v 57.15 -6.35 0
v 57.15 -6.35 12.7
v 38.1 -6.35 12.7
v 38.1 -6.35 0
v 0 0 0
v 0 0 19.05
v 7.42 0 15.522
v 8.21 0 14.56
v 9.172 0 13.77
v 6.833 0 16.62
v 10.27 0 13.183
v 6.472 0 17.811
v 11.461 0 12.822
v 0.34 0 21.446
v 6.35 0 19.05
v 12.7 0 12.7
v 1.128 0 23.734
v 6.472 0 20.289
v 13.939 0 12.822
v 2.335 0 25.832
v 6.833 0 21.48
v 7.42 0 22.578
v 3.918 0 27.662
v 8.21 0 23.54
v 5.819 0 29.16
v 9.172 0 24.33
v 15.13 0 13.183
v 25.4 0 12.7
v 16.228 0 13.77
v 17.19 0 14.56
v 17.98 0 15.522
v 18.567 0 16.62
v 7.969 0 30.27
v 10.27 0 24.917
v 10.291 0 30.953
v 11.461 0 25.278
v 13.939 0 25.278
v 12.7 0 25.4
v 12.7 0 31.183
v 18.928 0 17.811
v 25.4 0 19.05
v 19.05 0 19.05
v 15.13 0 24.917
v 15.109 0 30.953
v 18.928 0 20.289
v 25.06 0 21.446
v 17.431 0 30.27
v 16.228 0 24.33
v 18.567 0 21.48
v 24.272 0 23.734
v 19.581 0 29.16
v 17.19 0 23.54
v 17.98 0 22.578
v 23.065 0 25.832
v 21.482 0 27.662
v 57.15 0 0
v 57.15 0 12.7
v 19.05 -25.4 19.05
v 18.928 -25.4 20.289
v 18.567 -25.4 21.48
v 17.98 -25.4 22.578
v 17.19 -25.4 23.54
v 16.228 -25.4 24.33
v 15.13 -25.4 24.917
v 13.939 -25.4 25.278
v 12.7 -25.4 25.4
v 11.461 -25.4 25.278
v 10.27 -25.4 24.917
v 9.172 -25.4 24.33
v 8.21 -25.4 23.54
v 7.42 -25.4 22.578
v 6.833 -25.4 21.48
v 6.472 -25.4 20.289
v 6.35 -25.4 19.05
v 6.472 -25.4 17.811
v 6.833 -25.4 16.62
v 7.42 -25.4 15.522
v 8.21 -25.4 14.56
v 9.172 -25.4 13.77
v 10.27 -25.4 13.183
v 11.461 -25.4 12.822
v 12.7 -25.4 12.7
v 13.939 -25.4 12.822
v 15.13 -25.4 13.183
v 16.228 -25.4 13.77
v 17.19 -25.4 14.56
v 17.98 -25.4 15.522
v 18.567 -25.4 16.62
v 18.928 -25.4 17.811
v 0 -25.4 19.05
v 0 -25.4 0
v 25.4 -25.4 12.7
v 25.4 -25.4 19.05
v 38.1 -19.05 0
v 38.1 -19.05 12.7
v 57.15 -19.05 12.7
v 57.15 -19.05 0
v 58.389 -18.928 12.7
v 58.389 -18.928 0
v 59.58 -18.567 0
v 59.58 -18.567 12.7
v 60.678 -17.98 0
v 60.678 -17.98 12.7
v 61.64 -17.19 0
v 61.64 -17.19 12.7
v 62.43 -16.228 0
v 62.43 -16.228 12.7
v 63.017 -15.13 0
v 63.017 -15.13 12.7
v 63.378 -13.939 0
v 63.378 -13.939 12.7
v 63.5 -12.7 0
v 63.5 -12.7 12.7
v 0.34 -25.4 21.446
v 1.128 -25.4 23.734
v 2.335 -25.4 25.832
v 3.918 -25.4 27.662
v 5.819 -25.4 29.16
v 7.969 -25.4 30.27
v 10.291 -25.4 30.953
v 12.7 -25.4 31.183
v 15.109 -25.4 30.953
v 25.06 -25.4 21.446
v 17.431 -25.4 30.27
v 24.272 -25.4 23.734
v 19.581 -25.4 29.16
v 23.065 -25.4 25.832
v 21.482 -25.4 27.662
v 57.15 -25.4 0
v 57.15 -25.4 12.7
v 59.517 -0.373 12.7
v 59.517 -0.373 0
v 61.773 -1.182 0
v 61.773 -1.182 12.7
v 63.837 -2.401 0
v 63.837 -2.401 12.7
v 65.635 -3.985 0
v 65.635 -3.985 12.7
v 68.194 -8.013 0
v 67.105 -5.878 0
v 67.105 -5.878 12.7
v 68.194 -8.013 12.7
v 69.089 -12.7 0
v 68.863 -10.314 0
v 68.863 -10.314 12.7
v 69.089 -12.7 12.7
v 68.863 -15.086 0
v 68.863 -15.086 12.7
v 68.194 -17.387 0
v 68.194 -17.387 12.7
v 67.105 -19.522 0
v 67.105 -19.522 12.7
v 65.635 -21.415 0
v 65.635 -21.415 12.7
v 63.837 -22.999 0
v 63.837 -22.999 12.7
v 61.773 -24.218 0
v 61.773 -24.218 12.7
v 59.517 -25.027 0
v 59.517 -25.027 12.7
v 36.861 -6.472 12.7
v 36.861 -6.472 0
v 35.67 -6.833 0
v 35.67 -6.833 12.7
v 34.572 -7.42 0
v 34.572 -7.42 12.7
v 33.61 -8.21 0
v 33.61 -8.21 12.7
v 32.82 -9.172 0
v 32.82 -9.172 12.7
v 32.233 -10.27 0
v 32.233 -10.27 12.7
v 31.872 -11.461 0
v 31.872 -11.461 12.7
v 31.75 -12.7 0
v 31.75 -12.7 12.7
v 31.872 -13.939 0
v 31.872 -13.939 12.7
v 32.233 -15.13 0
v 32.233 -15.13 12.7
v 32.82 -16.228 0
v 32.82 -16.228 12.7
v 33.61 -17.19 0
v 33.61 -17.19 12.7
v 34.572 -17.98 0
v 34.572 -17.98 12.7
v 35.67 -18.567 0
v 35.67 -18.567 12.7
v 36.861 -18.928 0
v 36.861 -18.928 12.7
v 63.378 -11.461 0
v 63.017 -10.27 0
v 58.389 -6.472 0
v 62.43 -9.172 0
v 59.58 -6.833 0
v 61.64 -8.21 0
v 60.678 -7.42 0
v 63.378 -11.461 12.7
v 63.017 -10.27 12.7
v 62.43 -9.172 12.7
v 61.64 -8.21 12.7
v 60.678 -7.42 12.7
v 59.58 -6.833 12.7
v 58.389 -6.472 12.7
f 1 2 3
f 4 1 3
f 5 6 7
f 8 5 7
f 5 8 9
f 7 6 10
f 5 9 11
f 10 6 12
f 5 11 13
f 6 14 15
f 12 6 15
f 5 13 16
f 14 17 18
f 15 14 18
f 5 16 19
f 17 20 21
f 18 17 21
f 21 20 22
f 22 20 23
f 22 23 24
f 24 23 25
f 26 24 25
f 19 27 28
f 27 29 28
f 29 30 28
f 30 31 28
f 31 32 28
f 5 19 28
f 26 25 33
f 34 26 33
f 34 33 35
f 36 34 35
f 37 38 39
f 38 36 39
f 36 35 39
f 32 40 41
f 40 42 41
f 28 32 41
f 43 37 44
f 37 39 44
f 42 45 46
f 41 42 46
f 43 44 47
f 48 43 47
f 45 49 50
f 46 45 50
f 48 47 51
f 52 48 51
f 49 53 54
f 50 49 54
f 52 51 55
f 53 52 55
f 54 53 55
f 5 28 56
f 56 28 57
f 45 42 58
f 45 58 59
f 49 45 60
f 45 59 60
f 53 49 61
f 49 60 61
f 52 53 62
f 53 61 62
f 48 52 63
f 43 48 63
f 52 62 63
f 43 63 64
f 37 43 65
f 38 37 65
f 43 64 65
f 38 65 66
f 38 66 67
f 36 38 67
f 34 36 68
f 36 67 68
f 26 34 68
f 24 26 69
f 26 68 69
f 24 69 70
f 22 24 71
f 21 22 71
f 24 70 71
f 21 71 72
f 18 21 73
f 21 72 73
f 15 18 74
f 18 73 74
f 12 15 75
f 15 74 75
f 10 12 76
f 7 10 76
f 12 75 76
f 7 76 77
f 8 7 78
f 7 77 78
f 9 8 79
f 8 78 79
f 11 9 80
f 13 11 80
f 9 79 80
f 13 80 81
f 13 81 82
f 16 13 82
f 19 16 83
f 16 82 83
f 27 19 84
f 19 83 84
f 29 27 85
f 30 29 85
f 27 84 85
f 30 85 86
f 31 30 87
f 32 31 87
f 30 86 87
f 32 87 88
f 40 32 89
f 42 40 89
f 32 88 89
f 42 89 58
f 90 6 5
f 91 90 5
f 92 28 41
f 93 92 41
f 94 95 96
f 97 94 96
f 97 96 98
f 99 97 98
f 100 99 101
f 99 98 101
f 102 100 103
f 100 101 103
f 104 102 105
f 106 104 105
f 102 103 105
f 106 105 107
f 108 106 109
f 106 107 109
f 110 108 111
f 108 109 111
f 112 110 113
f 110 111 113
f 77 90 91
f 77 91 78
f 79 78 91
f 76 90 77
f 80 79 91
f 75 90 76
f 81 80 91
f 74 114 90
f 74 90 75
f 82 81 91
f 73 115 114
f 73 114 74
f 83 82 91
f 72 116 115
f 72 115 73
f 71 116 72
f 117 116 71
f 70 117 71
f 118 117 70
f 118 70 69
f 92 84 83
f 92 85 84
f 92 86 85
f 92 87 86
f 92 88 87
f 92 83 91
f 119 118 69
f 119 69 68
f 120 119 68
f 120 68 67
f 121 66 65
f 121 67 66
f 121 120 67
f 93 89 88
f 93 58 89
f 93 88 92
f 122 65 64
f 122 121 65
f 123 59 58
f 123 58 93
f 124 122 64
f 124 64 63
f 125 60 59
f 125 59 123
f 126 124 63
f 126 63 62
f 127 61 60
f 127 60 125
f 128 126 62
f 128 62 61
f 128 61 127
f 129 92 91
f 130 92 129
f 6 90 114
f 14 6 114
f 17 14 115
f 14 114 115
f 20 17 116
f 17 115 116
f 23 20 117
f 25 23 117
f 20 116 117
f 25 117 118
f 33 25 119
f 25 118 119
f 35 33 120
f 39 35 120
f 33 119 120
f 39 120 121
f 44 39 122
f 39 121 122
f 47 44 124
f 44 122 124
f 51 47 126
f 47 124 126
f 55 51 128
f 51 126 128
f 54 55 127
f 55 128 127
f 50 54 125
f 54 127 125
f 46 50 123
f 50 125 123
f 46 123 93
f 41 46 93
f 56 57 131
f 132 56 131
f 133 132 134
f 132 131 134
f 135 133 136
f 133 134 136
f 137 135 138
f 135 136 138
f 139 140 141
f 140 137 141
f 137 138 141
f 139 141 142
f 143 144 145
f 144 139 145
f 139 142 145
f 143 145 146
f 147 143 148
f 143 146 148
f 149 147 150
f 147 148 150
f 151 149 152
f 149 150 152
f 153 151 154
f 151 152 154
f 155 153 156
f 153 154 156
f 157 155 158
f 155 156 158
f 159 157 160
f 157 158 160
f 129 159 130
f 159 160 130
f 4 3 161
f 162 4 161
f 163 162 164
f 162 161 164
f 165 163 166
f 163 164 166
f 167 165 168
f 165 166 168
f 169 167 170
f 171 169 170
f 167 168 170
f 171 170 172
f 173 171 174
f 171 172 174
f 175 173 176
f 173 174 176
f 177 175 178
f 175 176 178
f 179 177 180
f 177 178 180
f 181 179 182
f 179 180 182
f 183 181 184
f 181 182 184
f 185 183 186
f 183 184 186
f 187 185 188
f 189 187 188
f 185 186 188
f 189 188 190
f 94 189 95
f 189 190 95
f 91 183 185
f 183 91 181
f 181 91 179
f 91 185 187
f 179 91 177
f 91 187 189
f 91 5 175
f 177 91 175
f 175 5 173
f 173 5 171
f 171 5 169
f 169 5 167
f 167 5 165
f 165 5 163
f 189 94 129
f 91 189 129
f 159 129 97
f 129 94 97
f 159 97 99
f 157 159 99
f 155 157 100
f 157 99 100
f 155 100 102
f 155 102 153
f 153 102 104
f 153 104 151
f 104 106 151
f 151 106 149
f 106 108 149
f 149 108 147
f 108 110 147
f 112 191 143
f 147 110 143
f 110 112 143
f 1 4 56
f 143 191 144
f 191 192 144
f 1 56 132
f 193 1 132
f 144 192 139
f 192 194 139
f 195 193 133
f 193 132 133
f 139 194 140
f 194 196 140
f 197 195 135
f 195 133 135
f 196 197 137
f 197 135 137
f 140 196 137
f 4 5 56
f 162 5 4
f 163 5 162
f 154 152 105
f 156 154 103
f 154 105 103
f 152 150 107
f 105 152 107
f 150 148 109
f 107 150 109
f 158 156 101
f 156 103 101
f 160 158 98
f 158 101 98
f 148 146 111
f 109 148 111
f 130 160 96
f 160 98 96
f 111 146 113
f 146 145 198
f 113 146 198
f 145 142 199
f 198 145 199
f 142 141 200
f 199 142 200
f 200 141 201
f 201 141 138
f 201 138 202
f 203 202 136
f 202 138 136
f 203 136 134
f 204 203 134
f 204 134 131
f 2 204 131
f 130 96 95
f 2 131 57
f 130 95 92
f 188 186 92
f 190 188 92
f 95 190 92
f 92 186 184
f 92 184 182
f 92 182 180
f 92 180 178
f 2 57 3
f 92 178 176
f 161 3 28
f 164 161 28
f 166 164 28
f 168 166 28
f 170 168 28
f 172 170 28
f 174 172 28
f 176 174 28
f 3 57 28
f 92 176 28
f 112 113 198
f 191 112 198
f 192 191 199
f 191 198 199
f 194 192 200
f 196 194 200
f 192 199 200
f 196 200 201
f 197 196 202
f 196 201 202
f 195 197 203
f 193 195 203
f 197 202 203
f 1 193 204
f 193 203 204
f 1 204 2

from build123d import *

# Parameters (mm, degrees)
F1_DEPTH = 25.4
F2_R     = 6.35
F3_DEPTH = 25.4
F5_DEPTH = 25.4


with BuildPart() as f1:
    # F0 (on Front) → F1 (new body)
    with BuildSketch(Plane.XZ):
        Polygon((0, 31.75), (0, 0), (69.85, 0), (69.85, 12.7), (25.4, 12.7), (25.4, 31.75), align=None)
    extrude(amount=F1_DEPTH)

    # F2 (on face) → F3 (cut)
    with BuildSketch(Plane.XZ.offset(25.4)):
        with BuildLine():
            ThreePointArc((0, 19.05), (12.7, 31.182884), (25.4, 19.05))
            Line((25.4, 19.05), (25.4, 31.75))
            Line((25.4, 31.75), (0, 31.75))
            Line((0, 31.75), (0, 19.05))
        make_face()
        with Locations((12.7, 19.05)):
            Circle(F2_R)
    extrude(amount=-F3_DEPTH, mode=Mode.SUBTRACT)

    # F4 (on face) → F5 (cut)
    with BuildSketch(Plane.XY.offset(12.7)):
        with BuildLine():
            ThreePointArc((38.1, -19.05), (42.590128, -17.190128), (44.45, -12.7))
            ThreePointArc((44.45, -12.7), (42.590128, -8.209872), (38.1, -6.35))
            ThreePointArc((38.1, -6.35), (31.75, -12.7), (38.1, -19.05))
        make_face()
        with BuildLine():
            ThreePointArc((38.1, -6.35), (42.590128, -8.209872), (44.45, -12.7))
            ThreePointArc((44.45, -12.7), (42.590128, -17.190128), (38.1, -19.05))
            Line((38.1, -19.05), (57.15, -19.05))
            ThreePointArc((57.15, -19.05), (50.8, -12.7), (57.15, -6.35))
            Line((57.15, -6.35), (38.1, -6.35))
        make_face()
        with BuildLine():
            ThreePointArc((63.5, -12.7), (61.640128, -8.209872), (57.15, -6.35))
            ThreePointArc((57.15, -6.35), (50.8, -12.7), (57.15, -19.05))
            ThreePointArc((57.15, -19.05), (61.640128, -17.190128), (63.5, -12.7))
        make_face()
        with BuildLine():
            ThreePointArc((57.15, 0), (69.088758, -12.7), (57.15, -25.4))
            Line((57.15, -25.4), (69.85, -25.4))
            Line((69.85, -25.4), (69.85, 0))
            Line((69.85, 0), (57.15, 0))
        make_face()
    extrude(amount=-F5_DEPTH, mode=Mode.SUBTRACT)


solid = f1.part
